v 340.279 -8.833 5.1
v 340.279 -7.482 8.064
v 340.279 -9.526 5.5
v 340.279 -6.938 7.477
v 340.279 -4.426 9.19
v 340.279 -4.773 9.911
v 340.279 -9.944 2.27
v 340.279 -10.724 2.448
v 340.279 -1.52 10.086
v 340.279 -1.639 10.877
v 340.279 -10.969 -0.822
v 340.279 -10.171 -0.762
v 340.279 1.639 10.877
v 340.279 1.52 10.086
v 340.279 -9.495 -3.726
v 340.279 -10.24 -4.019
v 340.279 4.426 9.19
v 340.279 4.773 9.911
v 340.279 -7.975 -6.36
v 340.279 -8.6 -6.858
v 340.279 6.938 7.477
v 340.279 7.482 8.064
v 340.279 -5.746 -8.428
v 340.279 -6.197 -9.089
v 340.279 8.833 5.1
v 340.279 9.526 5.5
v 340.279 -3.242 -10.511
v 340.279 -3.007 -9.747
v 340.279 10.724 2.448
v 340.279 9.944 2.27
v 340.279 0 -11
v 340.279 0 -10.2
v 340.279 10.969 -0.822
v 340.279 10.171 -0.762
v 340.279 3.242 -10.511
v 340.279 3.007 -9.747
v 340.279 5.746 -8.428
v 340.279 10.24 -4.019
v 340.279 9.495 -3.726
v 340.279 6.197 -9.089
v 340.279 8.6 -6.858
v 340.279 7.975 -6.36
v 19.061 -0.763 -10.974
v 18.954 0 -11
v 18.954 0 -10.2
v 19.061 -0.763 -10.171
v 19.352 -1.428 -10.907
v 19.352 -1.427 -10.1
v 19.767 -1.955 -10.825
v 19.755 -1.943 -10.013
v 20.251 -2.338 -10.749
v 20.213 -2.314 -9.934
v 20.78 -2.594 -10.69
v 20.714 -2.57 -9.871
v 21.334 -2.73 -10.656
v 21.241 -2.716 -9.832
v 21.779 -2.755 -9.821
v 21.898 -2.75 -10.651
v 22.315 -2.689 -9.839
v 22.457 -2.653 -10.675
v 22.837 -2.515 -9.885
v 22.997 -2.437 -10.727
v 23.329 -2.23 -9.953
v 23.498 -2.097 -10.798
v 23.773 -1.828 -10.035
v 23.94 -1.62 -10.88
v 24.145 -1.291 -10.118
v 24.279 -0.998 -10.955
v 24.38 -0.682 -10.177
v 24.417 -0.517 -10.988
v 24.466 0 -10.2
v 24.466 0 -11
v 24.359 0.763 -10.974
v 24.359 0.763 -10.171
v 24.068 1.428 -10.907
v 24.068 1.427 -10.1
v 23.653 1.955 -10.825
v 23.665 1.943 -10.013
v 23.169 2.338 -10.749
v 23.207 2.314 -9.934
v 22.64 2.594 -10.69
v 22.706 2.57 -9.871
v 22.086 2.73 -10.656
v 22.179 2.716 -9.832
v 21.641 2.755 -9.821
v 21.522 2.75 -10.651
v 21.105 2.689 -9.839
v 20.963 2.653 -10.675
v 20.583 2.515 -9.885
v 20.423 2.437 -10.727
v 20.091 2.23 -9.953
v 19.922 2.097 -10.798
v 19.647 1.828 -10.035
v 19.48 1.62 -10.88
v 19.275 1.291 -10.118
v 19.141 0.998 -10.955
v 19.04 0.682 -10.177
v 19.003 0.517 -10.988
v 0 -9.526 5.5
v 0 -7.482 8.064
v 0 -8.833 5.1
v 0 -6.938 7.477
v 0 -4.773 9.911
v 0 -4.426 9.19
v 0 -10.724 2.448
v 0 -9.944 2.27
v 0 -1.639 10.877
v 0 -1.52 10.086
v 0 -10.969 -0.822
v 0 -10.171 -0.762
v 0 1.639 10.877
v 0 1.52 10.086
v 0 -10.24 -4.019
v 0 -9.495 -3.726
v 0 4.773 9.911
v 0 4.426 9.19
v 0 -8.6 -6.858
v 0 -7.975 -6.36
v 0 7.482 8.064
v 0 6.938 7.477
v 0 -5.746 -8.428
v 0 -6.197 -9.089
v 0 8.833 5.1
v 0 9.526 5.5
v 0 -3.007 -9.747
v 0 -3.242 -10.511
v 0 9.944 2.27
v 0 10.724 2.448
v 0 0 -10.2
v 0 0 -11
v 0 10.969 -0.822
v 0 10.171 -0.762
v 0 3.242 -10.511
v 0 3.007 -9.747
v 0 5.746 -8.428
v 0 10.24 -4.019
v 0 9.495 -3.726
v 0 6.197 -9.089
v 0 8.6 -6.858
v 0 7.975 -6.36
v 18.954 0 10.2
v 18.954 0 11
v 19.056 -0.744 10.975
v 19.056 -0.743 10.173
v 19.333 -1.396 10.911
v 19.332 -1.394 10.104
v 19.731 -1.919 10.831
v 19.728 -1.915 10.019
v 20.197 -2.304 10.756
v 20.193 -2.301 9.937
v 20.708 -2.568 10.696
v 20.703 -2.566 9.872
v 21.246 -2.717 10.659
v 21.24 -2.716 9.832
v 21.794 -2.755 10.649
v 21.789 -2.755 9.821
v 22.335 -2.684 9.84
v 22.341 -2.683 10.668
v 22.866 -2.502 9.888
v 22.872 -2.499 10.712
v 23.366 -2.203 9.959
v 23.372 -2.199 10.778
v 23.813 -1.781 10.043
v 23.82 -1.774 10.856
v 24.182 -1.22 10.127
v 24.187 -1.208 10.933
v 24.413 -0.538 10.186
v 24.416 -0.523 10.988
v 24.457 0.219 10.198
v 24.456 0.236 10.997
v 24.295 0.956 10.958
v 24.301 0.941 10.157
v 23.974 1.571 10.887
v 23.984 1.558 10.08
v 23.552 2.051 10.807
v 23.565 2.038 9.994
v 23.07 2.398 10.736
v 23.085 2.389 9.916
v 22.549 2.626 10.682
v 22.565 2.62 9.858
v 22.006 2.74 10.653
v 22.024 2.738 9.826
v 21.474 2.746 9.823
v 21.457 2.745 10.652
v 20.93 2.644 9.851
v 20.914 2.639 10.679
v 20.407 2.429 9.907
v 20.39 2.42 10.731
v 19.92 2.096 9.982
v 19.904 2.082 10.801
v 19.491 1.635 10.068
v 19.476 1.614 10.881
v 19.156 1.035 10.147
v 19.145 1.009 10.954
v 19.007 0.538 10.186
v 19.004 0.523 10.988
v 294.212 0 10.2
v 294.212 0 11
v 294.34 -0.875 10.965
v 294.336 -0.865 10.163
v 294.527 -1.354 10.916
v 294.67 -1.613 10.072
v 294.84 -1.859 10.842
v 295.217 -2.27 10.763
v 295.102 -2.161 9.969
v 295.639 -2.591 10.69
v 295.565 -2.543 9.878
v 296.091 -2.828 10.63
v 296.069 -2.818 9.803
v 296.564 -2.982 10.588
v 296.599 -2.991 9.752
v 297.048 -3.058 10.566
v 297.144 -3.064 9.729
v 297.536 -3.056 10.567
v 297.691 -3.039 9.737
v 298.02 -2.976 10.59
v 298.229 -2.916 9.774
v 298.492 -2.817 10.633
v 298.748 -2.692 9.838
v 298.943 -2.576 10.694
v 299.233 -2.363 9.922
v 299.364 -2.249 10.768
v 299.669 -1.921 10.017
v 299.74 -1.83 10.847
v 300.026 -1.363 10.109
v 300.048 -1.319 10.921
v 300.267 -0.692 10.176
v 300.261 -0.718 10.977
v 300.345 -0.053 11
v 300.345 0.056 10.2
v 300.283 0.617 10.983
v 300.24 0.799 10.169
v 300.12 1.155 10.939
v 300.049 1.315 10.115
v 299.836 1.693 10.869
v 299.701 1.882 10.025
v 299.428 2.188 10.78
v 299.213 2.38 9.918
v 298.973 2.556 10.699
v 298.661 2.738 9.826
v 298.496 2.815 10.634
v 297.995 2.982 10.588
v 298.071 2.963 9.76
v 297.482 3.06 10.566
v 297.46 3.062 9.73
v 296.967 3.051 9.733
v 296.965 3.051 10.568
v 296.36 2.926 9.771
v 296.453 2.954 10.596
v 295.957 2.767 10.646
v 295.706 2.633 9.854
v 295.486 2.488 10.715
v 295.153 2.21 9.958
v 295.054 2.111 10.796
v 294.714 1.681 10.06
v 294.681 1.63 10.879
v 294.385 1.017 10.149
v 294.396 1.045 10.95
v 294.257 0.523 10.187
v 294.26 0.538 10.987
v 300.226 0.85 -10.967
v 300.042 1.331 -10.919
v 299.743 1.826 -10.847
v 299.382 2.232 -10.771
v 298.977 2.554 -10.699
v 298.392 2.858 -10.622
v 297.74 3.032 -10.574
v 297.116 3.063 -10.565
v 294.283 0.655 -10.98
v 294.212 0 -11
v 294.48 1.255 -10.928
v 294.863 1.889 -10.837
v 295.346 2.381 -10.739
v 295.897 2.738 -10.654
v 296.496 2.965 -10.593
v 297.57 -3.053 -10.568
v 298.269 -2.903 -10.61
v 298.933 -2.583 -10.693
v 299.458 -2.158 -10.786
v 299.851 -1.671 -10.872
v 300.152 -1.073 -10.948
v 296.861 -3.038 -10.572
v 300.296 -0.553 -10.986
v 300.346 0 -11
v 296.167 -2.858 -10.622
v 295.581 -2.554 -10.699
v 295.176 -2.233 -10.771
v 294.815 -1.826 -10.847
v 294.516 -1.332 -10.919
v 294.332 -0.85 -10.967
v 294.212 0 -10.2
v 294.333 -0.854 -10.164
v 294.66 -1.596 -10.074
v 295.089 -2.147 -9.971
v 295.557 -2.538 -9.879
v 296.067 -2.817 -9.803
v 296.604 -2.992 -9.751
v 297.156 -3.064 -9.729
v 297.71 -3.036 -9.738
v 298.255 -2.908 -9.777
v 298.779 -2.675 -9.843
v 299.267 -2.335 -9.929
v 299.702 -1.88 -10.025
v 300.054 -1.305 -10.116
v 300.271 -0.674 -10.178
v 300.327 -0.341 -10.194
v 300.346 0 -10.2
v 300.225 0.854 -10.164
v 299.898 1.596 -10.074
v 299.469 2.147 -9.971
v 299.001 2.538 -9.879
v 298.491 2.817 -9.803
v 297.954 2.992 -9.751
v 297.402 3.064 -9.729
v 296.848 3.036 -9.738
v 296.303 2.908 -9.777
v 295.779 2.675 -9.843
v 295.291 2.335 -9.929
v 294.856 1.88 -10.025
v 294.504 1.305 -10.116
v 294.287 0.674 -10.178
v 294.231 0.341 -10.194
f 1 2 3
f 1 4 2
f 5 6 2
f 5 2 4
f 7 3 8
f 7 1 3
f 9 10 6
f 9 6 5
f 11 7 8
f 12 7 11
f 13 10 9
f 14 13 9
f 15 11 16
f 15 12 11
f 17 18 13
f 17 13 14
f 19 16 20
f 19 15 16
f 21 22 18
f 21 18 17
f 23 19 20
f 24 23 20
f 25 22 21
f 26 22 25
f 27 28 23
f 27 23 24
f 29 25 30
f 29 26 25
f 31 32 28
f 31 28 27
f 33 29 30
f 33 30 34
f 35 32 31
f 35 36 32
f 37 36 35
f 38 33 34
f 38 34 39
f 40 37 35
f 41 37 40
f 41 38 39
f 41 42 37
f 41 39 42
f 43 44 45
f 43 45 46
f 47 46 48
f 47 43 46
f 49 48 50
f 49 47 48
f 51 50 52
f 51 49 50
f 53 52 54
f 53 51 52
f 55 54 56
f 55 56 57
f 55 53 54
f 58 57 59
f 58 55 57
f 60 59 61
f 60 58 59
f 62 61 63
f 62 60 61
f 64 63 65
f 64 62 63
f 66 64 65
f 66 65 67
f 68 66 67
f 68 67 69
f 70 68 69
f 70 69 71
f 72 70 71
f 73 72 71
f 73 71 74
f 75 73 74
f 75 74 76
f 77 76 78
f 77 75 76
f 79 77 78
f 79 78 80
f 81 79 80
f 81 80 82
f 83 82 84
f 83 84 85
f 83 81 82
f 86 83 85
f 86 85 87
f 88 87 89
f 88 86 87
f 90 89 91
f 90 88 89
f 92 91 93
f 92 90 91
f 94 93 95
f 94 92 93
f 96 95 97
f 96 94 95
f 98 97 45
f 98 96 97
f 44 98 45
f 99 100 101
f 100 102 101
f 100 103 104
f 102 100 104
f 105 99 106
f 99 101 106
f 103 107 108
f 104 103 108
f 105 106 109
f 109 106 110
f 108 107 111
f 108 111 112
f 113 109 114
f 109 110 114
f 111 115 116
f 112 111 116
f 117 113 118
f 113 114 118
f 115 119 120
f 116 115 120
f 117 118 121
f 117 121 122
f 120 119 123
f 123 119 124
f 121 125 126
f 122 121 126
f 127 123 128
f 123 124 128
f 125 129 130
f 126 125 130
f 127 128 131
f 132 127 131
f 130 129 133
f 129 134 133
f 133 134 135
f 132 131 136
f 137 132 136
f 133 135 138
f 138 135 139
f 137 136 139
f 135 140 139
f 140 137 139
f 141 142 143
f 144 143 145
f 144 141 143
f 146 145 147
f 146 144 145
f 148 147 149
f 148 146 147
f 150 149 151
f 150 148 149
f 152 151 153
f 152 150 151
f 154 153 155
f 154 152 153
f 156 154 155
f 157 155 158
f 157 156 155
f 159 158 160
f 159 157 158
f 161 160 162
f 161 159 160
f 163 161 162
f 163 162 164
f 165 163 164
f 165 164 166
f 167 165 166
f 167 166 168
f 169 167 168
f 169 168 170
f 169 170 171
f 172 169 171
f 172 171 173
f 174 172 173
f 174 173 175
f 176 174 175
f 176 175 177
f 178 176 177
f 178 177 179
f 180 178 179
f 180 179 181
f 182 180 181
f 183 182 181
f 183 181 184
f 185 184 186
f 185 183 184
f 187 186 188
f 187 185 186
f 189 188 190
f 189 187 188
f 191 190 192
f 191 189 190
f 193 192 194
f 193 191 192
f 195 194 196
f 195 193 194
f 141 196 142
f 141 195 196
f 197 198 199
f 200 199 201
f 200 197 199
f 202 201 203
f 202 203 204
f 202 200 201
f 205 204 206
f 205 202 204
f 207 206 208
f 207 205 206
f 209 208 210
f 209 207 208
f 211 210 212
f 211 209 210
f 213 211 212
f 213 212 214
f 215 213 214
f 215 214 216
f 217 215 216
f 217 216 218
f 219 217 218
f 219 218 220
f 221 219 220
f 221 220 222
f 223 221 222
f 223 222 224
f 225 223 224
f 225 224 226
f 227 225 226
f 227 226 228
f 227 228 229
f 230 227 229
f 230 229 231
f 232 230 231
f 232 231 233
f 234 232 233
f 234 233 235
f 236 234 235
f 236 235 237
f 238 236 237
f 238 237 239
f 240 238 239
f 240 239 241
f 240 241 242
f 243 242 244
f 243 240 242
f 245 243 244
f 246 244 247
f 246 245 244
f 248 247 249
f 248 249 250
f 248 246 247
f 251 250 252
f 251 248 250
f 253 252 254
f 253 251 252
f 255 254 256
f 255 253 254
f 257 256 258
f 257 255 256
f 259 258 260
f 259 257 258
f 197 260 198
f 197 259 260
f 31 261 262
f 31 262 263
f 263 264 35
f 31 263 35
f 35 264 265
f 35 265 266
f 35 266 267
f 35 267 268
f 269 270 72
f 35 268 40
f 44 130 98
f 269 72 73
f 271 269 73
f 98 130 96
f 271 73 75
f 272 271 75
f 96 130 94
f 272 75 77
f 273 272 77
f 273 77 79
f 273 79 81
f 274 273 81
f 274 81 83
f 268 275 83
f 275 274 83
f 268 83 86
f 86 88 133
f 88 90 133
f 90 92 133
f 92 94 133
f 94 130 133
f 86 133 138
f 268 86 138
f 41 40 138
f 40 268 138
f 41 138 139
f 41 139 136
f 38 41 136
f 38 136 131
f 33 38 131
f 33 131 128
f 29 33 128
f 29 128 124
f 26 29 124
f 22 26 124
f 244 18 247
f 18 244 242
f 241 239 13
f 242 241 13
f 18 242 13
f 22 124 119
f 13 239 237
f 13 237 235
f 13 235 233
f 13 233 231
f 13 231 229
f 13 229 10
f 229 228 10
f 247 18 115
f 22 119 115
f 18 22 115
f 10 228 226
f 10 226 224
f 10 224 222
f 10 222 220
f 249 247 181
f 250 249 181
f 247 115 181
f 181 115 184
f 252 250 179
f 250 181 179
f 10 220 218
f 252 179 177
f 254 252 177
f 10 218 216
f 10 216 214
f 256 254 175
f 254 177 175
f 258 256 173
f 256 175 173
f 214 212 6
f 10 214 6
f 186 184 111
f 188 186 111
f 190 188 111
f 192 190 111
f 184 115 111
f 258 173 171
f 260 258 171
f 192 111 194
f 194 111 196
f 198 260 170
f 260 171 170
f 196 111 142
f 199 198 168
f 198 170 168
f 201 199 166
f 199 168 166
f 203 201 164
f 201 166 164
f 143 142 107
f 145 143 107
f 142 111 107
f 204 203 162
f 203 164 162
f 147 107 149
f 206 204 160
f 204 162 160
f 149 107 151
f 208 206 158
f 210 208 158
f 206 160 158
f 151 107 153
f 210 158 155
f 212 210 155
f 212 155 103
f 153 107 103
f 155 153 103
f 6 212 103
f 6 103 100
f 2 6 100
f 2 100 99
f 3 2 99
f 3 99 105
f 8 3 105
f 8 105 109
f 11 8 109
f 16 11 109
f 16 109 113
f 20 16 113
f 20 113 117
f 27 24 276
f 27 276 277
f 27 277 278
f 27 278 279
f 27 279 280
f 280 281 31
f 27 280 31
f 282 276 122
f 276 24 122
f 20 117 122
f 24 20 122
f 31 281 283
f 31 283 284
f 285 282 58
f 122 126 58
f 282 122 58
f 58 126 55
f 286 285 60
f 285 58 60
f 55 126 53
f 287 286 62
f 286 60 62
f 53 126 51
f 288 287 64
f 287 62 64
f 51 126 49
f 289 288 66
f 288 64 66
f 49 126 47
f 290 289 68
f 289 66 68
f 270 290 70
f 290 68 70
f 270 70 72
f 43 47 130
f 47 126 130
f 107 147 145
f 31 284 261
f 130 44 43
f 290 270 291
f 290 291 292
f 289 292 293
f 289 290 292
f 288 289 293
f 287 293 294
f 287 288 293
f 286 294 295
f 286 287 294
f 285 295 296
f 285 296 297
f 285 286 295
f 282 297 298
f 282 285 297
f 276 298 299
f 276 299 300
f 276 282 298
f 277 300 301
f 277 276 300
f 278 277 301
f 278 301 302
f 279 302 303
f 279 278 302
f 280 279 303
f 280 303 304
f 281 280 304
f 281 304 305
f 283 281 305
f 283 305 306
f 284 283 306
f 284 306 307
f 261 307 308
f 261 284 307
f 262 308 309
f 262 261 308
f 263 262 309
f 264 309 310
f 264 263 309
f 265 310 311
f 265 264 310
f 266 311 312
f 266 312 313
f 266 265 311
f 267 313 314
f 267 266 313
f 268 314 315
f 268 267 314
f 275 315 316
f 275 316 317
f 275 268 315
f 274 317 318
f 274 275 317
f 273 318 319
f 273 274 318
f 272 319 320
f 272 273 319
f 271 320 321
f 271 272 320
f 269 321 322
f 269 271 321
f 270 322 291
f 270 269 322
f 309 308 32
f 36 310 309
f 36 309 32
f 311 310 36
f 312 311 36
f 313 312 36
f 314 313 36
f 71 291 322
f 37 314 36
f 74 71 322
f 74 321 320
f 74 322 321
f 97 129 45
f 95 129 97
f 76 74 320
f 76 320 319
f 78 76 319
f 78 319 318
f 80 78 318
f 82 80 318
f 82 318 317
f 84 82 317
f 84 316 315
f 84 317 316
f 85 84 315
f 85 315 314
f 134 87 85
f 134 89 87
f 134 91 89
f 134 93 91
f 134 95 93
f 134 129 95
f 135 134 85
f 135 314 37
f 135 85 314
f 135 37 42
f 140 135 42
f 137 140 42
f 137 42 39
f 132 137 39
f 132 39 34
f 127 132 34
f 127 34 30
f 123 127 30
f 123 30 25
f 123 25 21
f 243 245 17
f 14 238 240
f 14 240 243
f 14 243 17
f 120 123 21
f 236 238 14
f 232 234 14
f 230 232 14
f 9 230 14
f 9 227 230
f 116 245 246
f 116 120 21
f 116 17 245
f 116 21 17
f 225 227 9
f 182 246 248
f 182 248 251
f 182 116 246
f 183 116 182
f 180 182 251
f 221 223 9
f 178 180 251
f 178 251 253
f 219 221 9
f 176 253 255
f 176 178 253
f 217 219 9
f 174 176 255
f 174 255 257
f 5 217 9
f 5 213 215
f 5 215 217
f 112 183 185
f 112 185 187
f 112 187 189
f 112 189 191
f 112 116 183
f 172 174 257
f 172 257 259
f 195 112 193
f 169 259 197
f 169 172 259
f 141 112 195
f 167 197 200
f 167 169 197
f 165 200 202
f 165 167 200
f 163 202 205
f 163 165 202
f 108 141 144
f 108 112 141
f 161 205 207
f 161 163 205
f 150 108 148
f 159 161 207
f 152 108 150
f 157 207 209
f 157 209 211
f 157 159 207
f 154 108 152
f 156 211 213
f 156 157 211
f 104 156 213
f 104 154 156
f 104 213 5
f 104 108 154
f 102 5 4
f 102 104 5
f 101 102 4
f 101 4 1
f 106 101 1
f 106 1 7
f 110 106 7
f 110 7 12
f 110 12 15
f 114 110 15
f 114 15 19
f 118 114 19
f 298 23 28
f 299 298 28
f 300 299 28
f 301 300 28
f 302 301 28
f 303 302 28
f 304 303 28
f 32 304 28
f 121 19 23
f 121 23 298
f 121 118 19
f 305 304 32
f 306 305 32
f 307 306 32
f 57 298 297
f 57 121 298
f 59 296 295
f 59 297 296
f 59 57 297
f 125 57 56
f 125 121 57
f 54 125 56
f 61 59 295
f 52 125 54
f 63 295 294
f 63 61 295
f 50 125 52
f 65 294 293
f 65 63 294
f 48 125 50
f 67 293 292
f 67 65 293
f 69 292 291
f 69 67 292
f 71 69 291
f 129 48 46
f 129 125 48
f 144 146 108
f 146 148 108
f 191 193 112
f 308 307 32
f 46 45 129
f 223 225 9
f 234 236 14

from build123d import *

# Parameters (mm, degrees)
SKETCH1_R               = 11
SKETCH1_R_2             = 10.2
BOSS_EXTRUDE1_DEPTH     = 340.279
CUT_EXTRUDE1_DEPTH      = 378.64
CUT_EXTRUDE1_DEPTH_BACK = 378.64
SKETCH2_R               = 2.756225819
SKETCH2_R_2             = 3.066881292


with BuildPart() as part:
    # Sketch1 → Boss-Extrude1 (new body)
    with BuildSketch(Plane(origin=(0, 0, 0), x_dir=(0, 0, -1), z_dir=(1, 0, 0))):
        Circle(SKETCH1_R)
        Circle(SKETCH1_R_2, mode=Mode.SUBTRACT)
    extrude(amount=BOSS_EXTRUDE1_DEPTH)

    # Sketch2 → Cut-Extrude1 (cut, two sides: drawn at the far end of the back side and taken through both)
    with BuildSketch(Plane.XY.offset(-CUT_EXTRUDE1_DEPTH_BACK)):
        with Locations((21.71, 0)):
            Circle(SKETCH2_R)
        with Locations((297.279, 0)):
            Circle(SKETCH2_R_2)
    extrude(amount=CUT_EXTRUDE1_DEPTH + CUT_EXTRUDE1_DEPTH_BACK, mode=Mode.SUBTRACT)


solid = part.part
